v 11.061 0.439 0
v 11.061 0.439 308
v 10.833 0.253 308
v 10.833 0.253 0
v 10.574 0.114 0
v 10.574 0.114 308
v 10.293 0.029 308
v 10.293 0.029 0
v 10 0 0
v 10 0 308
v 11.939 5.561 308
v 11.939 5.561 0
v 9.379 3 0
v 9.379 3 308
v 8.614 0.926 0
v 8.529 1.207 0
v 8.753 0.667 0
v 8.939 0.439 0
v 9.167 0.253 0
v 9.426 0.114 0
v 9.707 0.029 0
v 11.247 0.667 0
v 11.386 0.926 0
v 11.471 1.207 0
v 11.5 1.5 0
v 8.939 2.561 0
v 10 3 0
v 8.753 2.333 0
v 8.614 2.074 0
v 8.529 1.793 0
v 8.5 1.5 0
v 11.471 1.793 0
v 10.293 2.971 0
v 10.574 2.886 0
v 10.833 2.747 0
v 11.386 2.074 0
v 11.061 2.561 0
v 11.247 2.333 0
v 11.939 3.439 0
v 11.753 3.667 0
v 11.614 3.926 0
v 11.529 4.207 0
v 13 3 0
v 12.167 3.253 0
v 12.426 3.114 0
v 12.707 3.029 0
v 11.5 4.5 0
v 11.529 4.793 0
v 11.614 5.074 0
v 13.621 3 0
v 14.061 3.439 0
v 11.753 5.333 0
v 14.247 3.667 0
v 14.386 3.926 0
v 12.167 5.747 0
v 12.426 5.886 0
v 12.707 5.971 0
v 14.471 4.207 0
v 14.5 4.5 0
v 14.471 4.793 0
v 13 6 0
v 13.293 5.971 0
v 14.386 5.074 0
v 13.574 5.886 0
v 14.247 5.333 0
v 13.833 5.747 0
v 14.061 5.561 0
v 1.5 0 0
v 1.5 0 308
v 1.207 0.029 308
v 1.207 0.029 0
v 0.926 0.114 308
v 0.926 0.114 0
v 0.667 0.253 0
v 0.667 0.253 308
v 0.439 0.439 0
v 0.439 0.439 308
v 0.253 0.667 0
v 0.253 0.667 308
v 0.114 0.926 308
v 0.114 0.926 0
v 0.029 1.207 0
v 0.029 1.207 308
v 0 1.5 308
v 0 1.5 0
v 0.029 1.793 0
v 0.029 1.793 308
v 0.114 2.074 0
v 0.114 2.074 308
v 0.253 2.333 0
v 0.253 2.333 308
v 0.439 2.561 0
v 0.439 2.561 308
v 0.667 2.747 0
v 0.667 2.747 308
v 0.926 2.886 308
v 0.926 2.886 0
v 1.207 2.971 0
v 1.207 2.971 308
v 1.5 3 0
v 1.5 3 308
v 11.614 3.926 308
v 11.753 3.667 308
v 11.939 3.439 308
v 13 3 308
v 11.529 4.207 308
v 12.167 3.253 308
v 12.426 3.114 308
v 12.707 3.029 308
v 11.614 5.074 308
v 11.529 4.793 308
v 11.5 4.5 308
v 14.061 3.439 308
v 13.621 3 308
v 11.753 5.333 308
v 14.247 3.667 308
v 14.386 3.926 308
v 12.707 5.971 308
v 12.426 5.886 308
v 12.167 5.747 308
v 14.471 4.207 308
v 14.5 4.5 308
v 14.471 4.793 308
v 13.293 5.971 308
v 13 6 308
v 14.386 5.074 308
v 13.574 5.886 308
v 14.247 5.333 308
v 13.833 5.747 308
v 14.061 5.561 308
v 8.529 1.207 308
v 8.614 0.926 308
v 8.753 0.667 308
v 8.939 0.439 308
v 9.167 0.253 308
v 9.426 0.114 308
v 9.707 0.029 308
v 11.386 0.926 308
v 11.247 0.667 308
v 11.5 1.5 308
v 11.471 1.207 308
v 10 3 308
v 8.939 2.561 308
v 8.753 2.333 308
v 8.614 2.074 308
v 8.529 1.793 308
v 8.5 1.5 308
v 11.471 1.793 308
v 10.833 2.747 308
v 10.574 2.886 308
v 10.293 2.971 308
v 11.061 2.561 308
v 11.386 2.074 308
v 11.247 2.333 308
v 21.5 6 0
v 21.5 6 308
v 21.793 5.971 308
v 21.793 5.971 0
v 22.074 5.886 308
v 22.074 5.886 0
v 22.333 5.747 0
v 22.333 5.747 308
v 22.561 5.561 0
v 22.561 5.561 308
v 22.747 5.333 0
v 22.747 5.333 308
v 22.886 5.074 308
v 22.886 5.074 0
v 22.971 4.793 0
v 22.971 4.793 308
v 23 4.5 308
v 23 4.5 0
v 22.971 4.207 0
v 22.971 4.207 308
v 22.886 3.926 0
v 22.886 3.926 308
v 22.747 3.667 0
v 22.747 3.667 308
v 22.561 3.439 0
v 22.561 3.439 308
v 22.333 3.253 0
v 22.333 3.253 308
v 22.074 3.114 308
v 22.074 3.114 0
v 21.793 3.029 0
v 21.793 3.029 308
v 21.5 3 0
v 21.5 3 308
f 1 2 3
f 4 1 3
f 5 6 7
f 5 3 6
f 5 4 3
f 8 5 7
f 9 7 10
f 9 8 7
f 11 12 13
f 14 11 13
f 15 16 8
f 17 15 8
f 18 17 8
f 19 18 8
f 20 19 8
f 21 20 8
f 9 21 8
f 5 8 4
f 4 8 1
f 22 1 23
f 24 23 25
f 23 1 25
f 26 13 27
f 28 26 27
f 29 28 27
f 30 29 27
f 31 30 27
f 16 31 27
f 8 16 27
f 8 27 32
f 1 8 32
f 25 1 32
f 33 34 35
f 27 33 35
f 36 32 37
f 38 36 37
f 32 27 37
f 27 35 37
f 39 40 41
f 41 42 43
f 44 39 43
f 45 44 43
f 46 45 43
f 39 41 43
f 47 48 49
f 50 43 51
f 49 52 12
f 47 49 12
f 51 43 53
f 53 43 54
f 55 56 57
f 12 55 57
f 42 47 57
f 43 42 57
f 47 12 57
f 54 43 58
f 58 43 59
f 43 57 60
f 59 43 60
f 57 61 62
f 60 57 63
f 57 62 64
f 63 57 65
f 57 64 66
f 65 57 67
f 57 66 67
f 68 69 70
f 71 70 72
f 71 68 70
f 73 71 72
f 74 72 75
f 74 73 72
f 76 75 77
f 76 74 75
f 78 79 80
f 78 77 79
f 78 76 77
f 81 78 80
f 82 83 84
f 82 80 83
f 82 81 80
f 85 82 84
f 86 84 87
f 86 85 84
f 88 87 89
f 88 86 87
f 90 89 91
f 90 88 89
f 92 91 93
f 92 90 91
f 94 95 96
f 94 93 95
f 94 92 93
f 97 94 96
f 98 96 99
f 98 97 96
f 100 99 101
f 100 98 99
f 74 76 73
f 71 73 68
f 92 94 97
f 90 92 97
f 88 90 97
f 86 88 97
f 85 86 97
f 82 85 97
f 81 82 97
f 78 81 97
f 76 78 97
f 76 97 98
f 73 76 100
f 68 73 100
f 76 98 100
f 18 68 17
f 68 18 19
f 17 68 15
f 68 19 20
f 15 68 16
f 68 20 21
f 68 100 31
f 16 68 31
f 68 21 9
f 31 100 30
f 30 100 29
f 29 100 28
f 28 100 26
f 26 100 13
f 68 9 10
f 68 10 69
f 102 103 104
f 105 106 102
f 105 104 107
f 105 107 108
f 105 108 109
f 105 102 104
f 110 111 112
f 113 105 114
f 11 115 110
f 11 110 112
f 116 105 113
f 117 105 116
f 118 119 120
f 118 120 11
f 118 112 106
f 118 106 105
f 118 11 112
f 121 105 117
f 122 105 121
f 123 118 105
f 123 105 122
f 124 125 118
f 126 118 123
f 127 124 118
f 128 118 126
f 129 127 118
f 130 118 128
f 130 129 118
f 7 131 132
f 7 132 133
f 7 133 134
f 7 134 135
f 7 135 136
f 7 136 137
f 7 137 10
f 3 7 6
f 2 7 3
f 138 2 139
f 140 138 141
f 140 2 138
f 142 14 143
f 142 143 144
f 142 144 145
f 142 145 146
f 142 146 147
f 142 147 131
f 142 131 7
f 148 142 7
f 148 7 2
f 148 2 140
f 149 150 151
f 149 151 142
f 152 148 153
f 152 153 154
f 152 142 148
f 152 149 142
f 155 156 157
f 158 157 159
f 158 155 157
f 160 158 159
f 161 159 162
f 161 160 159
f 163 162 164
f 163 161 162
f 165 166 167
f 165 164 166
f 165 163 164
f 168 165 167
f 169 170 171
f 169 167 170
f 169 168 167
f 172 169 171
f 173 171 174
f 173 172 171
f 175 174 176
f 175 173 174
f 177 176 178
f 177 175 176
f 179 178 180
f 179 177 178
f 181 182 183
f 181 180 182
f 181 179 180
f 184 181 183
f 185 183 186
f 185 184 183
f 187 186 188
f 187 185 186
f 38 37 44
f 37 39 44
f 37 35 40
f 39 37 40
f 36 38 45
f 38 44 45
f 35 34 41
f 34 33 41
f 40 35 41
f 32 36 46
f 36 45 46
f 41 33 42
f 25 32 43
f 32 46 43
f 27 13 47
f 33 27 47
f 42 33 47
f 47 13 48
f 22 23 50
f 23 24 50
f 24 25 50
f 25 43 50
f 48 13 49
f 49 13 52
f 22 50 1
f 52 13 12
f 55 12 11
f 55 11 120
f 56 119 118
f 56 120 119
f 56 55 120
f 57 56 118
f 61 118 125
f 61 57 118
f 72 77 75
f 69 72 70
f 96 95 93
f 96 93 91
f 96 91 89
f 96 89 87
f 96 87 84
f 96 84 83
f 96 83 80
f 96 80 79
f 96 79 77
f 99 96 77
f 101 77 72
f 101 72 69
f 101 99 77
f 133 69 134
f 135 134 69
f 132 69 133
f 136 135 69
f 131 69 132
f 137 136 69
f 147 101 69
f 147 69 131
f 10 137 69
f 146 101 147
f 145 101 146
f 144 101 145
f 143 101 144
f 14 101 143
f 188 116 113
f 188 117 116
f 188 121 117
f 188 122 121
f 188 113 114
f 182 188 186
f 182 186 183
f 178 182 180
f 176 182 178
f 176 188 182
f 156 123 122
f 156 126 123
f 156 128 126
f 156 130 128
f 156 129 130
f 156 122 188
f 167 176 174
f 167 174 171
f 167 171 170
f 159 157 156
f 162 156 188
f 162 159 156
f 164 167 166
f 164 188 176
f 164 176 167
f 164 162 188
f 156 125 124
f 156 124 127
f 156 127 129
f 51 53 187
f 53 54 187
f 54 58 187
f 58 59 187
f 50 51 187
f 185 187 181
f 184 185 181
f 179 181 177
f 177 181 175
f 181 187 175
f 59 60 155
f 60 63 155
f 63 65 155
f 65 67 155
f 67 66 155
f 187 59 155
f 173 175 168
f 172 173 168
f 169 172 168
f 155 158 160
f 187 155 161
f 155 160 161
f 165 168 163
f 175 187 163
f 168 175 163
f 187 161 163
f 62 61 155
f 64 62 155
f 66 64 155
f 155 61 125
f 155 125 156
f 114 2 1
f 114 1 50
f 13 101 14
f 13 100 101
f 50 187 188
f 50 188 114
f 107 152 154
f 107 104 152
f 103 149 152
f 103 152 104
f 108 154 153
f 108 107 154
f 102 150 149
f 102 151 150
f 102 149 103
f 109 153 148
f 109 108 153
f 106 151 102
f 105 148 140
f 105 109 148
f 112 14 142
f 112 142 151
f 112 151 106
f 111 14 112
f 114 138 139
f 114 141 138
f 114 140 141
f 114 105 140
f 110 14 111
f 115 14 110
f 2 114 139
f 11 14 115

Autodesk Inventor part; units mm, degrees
ref_plane "YZ Plane" through (0, 0, 0) normal (1, 0, 0) x (0, 1, 0)
ref_plane "XZ Plane" through (0, 0, 0) normal (0, 1, 0) x (-1, 0, 0)
ref_plane "XY Plane" through (0, 0, 0) normal (0, 0, 1) x (1, 0, 0)
sketch "Sketch1" plane through (0, 0, 0) normal (0, 0, 1) x (1, 0, 0)
  line L0 (0, 0) -> (23, 0) construction
  line L1 (23, 0) -> (23, 6) construction
  line L2 (23, 6) -> (0, 6) construction
  line L3 (0, 6) -> (0, 0) construction
  line L4 (0, 3) -> (23, 3) construction
  line L5 (11.5, 0) -> (11.5, 3) construction
  line L6 (11.5, 3) -> (11.5, 6) construction
  line L7 (11.5, 1.5) -> (0, 1.5) construction
  line L8 (11.5, 4.5) -> (23, 4.5) construction
  line L9 (0, 1.5) -> (11.5, 1.5) construction
  line L10 (1.5, 3) -> (10, 3)
  line L11 (10, 0) -> (1.5, 0)
  arc A0 (1.5, 3) -> (1.5, 0) centre (1.5, 1.5) ccw
  arc A1 (10, 0) -> (10, 3) centre (10, 1.5) ccw
  line L12 (11.5, 4.5) -> (23, 4.5) construction
  line L13 (13, 6) -> (21.5, 6)
  line L14 (21.5, 3) -> (13, 3)
  arc A2 (13, 6) -> (13, 3) centre (13, 4.5) ccw
  arc A3 (21.5, 3) -> (21.5, 6) centre (21.5, 4.5) ccw
  line L15 (10, 1.5) -> (13, 4.5) construction
  line L16 (11.0607, 0.4393) -> (14.0607, 3.4393)
  line L17 (11.9393, 5.5607) -> (8.9393, 2.5607)
  arc A4 (8.9393, 2.5607) -> (11.0607, 0.4393) centre (10, 1.5) ccw
  arc A5 (14.0607, 3.4393) -> (11.9393, 5.5607) centre (13, 4.5) ccw
  point P0 (5.75, 1.5)
  point P1 (17.25, 4.5)
  point P2 (11.5, 3)
  point P3 (9.3787, 3)
  point P4 (13.6213, 3)
  dimension "d6" = 23
  dimension "d7" = 6
  dimension "d8" = 3
extrude "Extrusion1" add sketch "Sketch1" along normal blind 308
properties part number "Door Seal" material "Rubber"
